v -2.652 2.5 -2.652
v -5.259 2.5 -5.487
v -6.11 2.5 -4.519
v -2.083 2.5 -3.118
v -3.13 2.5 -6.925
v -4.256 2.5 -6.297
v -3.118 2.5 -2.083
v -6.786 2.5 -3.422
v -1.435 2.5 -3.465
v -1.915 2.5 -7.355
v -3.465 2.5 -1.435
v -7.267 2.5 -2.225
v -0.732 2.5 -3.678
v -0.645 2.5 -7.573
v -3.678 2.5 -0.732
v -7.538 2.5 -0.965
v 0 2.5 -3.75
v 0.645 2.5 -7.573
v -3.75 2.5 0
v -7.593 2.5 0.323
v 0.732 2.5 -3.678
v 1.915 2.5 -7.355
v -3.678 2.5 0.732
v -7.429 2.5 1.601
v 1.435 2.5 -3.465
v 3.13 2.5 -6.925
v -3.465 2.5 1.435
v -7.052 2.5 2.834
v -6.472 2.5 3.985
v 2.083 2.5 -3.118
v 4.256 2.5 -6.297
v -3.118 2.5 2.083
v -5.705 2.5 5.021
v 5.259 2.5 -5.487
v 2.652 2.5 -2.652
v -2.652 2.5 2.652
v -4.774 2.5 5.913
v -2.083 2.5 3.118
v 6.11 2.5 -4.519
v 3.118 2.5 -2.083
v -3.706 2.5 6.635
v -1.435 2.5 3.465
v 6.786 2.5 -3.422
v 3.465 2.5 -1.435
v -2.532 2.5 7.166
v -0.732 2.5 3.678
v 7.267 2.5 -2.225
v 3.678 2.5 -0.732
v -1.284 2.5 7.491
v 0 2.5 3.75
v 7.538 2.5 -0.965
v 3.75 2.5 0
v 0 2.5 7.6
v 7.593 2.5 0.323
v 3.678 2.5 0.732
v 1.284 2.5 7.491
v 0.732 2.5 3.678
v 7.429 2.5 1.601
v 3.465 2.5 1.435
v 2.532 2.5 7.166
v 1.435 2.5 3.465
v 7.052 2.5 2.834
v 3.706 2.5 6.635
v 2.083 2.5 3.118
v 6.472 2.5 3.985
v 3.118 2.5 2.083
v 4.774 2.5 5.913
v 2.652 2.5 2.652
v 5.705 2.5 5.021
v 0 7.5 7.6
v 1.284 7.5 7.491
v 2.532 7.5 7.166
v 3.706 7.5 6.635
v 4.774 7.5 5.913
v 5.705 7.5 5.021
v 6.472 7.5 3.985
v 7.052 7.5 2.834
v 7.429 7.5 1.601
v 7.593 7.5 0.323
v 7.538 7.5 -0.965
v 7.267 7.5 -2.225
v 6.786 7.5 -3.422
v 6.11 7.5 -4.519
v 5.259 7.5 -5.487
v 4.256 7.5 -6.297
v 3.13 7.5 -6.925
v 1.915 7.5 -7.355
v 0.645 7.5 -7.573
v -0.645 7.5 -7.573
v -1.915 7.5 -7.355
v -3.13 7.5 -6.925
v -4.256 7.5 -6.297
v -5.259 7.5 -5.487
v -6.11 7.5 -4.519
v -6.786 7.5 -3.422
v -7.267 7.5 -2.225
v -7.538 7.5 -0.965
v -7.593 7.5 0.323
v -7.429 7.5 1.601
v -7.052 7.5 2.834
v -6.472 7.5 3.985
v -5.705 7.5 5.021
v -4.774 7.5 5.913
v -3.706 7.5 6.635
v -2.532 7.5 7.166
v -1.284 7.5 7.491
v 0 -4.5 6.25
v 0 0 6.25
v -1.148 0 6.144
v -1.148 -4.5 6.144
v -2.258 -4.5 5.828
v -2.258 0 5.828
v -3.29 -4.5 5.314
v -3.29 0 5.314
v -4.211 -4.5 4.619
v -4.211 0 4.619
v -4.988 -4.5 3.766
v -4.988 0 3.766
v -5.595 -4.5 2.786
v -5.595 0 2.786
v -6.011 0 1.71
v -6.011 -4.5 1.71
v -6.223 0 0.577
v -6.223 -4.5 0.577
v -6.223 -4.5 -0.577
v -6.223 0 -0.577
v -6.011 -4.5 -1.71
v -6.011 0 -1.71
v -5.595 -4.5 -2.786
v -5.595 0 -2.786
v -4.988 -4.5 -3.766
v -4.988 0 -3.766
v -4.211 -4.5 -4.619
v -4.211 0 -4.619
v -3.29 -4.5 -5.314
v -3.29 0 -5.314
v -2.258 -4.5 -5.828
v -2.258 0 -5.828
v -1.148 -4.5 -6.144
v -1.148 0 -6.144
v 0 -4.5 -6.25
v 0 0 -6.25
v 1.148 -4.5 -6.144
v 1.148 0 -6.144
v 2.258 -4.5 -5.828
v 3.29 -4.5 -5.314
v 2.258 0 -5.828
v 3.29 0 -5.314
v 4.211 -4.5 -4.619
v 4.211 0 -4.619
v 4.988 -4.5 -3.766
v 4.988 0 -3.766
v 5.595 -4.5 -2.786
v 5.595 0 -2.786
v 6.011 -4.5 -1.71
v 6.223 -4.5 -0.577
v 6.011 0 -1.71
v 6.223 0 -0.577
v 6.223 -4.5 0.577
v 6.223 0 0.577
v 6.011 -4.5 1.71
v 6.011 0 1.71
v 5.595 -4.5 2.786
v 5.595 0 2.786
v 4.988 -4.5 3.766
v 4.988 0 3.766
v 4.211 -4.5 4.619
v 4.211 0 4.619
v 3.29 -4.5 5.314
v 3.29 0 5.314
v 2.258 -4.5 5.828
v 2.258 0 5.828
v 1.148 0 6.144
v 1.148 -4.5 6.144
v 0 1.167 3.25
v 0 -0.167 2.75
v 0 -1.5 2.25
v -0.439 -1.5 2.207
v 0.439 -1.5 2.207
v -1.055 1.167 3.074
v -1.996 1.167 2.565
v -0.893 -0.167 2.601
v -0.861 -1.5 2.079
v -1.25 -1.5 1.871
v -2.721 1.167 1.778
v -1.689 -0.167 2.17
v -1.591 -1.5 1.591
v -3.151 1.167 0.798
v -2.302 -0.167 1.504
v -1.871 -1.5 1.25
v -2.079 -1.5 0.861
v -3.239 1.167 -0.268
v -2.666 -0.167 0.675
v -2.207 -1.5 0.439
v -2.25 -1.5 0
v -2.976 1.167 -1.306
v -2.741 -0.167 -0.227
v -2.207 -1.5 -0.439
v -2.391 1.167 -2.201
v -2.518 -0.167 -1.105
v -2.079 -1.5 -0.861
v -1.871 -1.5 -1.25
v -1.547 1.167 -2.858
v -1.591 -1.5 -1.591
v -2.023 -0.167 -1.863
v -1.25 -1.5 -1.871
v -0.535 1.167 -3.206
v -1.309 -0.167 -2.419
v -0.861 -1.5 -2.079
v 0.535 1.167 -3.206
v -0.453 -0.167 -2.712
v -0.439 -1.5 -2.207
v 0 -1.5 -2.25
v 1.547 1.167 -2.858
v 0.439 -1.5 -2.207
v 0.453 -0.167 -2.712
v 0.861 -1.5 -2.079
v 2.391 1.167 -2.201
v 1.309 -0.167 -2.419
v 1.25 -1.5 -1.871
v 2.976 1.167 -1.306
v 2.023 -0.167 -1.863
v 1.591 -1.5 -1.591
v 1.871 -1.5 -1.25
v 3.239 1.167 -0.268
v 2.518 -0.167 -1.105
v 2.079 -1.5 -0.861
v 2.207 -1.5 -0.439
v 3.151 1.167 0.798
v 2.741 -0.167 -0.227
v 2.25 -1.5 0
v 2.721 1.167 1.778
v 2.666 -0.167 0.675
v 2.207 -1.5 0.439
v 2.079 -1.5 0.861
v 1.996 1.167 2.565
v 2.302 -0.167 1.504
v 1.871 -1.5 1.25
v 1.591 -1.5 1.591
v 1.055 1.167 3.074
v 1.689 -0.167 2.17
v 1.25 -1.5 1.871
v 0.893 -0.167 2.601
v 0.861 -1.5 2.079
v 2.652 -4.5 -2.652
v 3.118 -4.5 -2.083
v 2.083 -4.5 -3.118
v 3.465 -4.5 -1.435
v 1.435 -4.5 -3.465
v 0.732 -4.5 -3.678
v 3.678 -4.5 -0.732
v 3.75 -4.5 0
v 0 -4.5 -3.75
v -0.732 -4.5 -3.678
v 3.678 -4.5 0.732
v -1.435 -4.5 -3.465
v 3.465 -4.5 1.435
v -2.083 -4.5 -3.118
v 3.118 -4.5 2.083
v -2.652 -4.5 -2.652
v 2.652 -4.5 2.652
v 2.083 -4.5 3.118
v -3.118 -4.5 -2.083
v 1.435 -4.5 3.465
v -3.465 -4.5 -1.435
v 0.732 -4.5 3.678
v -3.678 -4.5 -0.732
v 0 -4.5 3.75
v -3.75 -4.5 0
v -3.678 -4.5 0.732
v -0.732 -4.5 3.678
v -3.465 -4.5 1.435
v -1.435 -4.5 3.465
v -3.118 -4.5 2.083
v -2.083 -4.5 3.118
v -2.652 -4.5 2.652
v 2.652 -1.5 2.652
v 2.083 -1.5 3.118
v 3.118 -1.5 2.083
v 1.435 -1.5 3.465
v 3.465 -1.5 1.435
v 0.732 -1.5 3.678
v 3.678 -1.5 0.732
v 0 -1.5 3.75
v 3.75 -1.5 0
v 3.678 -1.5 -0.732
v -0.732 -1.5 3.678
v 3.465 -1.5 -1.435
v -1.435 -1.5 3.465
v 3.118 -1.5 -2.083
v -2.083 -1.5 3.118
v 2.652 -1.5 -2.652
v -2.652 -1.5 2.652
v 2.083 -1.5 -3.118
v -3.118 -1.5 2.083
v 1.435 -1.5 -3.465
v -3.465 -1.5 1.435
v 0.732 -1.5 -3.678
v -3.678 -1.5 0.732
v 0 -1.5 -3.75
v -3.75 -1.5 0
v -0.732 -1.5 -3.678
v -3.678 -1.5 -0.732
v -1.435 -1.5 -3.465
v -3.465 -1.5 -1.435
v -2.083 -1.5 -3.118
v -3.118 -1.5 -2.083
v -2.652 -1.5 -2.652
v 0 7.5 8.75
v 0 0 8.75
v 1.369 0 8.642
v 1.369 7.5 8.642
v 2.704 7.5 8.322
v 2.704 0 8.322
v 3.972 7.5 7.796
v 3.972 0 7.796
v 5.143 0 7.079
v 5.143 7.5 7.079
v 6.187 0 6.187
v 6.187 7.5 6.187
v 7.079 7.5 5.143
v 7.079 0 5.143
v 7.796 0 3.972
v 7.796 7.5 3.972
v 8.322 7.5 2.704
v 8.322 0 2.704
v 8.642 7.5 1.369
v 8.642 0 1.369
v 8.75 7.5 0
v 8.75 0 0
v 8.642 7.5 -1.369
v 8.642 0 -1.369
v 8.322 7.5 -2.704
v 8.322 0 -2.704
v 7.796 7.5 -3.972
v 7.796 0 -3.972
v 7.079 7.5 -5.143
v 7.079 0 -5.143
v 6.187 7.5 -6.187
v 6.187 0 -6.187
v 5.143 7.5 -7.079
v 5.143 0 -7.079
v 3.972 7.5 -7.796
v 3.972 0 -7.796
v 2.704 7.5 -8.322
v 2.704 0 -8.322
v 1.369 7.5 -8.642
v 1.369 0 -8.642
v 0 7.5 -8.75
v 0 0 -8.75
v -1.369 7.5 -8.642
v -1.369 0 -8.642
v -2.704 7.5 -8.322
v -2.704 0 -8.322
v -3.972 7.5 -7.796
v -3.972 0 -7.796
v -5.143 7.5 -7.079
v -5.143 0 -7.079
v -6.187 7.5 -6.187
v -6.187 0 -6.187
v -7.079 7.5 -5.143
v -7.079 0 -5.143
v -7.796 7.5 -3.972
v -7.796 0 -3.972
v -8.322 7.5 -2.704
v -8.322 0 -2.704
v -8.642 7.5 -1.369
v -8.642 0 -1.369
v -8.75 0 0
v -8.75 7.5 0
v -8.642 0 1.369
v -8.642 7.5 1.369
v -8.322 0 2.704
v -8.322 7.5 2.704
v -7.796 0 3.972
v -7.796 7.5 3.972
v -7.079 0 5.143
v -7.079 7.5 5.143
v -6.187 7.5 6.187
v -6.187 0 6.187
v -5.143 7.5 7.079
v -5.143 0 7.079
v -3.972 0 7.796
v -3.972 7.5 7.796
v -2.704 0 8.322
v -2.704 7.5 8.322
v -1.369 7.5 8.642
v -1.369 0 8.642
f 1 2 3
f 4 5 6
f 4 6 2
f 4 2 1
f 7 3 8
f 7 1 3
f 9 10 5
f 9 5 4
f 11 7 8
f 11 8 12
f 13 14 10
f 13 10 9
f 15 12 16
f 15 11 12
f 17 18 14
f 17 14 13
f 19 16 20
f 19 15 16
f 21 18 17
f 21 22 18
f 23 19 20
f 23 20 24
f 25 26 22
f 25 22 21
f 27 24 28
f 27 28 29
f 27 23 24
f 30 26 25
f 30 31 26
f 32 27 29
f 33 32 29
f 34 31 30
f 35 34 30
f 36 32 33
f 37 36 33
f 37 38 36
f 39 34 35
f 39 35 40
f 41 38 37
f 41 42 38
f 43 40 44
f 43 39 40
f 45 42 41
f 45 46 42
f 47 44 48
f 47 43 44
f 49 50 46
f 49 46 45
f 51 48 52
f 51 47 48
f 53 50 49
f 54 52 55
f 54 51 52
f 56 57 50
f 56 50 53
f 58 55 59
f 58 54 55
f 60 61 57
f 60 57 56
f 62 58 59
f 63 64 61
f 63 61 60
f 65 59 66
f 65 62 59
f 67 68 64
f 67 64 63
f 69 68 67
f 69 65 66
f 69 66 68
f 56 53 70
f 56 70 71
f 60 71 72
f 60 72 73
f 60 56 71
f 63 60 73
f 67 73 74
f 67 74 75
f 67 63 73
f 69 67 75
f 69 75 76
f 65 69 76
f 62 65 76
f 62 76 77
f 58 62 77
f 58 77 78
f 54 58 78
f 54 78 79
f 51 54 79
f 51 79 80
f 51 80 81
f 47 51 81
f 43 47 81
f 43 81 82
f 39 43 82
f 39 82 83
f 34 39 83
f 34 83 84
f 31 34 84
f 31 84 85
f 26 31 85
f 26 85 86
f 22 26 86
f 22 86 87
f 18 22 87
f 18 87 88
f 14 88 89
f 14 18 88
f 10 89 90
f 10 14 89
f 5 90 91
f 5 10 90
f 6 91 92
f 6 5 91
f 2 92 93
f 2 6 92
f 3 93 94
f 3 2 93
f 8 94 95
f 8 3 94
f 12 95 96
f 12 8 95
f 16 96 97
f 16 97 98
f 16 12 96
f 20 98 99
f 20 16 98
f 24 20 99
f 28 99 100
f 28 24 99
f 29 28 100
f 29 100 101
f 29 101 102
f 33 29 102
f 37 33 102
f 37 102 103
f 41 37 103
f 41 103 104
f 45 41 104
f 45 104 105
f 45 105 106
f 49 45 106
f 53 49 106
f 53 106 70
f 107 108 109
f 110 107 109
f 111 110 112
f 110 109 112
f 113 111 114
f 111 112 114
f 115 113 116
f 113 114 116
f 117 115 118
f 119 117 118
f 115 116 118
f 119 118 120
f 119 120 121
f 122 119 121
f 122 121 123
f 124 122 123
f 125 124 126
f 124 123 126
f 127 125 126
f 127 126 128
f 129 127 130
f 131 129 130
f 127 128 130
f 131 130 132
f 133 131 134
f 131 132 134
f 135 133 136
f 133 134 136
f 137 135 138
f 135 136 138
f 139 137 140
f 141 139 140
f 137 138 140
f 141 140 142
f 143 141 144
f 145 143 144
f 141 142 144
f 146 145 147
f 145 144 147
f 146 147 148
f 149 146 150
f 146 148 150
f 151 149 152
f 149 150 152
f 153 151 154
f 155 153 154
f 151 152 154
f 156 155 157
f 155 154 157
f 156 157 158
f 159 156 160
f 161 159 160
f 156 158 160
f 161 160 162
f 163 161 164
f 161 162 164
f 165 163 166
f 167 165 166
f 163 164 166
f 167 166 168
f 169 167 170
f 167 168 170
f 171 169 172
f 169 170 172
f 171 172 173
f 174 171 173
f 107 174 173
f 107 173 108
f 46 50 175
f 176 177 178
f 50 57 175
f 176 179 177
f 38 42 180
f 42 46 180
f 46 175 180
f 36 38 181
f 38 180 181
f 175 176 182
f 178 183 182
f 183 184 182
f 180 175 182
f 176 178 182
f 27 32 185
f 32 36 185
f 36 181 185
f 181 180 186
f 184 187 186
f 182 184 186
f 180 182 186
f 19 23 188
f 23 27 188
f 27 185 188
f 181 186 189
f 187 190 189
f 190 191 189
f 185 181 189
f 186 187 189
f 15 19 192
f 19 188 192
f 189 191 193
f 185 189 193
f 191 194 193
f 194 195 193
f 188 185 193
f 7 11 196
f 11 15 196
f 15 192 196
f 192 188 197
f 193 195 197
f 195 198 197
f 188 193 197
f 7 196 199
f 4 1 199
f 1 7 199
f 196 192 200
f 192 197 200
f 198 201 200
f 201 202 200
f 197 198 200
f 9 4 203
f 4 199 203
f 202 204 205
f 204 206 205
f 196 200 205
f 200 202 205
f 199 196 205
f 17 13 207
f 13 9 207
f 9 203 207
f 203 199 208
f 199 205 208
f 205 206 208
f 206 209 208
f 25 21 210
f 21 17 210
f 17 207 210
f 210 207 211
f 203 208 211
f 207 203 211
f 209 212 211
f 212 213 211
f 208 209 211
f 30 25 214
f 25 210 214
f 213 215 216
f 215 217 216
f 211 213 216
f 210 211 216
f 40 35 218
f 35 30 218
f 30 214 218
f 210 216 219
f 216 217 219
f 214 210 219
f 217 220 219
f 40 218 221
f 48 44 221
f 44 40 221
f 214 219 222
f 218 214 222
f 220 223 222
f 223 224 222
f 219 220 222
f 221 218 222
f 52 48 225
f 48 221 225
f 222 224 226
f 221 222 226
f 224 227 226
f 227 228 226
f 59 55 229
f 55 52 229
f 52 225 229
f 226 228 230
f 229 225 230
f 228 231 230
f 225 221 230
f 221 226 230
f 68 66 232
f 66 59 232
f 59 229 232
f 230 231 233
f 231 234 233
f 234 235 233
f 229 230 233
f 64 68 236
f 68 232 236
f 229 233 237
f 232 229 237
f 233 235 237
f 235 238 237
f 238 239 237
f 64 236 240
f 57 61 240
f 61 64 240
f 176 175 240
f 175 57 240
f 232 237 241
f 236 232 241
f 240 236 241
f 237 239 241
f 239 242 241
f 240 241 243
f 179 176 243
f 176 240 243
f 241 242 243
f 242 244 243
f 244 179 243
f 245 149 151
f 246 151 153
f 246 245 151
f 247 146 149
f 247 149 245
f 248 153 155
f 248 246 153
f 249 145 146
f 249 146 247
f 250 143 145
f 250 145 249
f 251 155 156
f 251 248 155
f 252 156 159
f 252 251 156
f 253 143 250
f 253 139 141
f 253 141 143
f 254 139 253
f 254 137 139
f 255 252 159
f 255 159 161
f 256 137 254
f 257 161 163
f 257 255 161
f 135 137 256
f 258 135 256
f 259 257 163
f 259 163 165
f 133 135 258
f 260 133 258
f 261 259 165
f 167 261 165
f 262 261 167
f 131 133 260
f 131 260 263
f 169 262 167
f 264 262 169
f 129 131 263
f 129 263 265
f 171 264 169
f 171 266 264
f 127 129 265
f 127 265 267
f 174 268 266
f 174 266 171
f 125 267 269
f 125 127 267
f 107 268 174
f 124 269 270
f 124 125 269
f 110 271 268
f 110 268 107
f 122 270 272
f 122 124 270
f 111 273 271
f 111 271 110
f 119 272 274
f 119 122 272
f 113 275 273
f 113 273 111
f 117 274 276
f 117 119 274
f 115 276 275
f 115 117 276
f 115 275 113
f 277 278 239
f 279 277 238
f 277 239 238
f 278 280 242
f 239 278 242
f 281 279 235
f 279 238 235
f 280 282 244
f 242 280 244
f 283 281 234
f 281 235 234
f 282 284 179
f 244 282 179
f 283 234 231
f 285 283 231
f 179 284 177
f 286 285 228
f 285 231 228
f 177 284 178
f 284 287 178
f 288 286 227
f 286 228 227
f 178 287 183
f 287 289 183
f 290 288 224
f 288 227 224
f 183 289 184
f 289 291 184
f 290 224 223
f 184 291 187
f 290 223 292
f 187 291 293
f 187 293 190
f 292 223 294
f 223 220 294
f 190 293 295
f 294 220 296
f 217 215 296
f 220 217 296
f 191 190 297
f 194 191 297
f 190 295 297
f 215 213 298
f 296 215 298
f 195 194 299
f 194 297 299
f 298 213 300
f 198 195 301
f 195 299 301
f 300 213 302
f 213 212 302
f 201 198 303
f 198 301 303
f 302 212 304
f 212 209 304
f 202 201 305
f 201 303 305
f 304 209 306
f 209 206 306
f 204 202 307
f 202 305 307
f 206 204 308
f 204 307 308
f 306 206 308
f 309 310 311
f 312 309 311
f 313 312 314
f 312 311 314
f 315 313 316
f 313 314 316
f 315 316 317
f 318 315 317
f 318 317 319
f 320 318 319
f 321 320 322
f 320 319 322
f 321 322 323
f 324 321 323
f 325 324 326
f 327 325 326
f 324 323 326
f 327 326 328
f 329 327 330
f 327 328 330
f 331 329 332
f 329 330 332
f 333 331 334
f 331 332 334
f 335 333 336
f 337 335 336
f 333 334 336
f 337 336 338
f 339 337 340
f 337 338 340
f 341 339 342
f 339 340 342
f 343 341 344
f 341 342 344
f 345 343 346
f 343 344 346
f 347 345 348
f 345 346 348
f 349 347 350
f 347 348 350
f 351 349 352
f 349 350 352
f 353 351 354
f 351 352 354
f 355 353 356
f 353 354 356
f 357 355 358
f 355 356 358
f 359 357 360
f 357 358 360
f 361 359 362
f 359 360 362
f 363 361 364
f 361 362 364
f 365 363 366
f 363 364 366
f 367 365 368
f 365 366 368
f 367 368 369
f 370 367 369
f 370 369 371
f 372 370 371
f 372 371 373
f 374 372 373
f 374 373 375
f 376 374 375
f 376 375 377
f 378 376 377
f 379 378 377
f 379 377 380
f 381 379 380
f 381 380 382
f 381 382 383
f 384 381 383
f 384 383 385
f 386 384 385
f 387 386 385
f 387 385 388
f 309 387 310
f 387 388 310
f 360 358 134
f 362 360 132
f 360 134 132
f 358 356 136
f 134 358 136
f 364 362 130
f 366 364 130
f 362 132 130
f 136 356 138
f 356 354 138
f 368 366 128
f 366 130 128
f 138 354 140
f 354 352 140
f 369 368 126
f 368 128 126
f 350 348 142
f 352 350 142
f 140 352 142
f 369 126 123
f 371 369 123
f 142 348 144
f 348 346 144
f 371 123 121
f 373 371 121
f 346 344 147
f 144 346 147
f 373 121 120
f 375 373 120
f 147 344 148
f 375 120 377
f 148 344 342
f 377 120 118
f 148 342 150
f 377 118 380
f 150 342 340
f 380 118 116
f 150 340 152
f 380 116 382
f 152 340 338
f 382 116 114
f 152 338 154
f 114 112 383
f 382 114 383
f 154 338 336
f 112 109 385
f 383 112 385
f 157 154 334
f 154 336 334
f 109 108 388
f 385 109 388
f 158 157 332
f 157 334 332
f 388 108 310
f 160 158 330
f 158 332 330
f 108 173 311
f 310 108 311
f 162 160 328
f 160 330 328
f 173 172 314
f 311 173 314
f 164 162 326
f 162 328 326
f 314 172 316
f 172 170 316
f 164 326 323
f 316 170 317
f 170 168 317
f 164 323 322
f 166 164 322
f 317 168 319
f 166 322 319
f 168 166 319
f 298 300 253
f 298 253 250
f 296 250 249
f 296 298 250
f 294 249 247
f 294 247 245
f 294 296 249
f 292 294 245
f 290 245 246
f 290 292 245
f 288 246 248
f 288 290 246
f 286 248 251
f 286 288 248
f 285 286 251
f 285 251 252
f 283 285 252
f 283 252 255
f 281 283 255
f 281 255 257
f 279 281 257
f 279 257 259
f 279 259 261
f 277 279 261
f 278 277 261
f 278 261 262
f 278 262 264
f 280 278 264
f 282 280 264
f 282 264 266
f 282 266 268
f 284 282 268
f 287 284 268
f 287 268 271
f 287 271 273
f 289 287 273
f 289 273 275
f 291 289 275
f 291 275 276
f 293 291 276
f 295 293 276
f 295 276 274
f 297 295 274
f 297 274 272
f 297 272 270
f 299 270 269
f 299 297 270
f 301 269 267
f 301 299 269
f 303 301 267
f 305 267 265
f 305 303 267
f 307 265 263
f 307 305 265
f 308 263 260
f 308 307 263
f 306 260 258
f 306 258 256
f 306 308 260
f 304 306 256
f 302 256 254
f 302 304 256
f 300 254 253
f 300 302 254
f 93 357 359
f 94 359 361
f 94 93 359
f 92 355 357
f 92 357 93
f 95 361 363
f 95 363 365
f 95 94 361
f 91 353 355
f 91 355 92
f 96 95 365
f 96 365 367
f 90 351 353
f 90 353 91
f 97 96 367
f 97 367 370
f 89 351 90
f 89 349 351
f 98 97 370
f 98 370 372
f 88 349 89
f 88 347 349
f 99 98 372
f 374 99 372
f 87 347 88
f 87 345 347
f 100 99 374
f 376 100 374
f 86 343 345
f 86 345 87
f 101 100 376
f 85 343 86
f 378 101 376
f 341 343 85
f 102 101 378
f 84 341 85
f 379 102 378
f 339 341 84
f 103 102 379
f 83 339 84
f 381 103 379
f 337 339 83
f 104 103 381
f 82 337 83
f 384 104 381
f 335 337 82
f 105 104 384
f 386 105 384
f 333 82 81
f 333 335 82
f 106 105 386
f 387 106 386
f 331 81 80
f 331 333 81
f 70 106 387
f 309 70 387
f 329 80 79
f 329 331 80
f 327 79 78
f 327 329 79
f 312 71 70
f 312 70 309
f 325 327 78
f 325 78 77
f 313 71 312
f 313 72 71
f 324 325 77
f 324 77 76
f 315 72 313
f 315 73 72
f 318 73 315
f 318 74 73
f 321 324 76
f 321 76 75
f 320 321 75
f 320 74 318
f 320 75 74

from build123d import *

# Parameters (mm, degrees)
SKETCH1_R           = 8.75
SKETCH1_R_2         = 7.6
BOSS_EXTRUDE1_DEPTH = 7.5
SKETCH1_2_R         = 7.6
BOSS_EXTRUDE2_DEPTH = 2.5
SKETCH2_R           = 6.25
SKETCH2_R_2         = 3.75
BOSS_EXTRUDE3_DEPTH = 4.5
CUT_EXTRUDE1_START  = -4.5
SKETCH3_R           = 3.75
CUT_EXTRUDE1_DEPTH  = 4.5


with BuildPart() as part:
    # Sketch1 → Boss-Extrude1 (new body)
    with BuildSketch(Plane(origin=(0, 0, 0), x_dir=(1, 0, 0), z_dir=(0, 1, 0))):
        Circle(SKETCH1_R)
        Circle(SKETCH1_R_2, mode=Mode.SUBTRACT)
    extrude(amount=BOSS_EXTRUDE1_DEPTH)

    # Sketch1<2> → Boss-Extrude2 (add)
    with BuildSketch(Plane(origin=(0, 0, 0), x_dir=(1, 0, 0), z_dir=(0, 1, 0))):
        Circle(SKETCH1_2_R)
    extrude(amount=BOSS_EXTRUDE2_DEPTH)

    # Sketch2 → Boss-Extrude3 (add)
    with BuildSketch(Plane.XZ):
        Circle(SKETCH2_R)
        Circle(SKETCH2_R_2, mode=Mode.SUBTRACT)
    extrude(amount=BOSS_EXTRUDE3_DEPTH)

    # Sketch3 → Cut-Extrude1 (cut)
    with BuildSketch(Plane.XZ.offset(CUT_EXTRUDE1_START)):
        Circle(SKETCH3_R)
    extrude(amount=CUT_EXTRUDE1_DEPTH, mode=Mode.SUBTRACT)

    # Sketch4 → Revolve1 (revolve)
    with BuildSketch(Plane.XY):
        Polygon((3.75, -1.5), (3.75, 2.5), (2.25, -1.5), align=None)
    revolve(axis=Axis((0, 6.48863082, 0), (0, -1, 0)))


solid = part.part
